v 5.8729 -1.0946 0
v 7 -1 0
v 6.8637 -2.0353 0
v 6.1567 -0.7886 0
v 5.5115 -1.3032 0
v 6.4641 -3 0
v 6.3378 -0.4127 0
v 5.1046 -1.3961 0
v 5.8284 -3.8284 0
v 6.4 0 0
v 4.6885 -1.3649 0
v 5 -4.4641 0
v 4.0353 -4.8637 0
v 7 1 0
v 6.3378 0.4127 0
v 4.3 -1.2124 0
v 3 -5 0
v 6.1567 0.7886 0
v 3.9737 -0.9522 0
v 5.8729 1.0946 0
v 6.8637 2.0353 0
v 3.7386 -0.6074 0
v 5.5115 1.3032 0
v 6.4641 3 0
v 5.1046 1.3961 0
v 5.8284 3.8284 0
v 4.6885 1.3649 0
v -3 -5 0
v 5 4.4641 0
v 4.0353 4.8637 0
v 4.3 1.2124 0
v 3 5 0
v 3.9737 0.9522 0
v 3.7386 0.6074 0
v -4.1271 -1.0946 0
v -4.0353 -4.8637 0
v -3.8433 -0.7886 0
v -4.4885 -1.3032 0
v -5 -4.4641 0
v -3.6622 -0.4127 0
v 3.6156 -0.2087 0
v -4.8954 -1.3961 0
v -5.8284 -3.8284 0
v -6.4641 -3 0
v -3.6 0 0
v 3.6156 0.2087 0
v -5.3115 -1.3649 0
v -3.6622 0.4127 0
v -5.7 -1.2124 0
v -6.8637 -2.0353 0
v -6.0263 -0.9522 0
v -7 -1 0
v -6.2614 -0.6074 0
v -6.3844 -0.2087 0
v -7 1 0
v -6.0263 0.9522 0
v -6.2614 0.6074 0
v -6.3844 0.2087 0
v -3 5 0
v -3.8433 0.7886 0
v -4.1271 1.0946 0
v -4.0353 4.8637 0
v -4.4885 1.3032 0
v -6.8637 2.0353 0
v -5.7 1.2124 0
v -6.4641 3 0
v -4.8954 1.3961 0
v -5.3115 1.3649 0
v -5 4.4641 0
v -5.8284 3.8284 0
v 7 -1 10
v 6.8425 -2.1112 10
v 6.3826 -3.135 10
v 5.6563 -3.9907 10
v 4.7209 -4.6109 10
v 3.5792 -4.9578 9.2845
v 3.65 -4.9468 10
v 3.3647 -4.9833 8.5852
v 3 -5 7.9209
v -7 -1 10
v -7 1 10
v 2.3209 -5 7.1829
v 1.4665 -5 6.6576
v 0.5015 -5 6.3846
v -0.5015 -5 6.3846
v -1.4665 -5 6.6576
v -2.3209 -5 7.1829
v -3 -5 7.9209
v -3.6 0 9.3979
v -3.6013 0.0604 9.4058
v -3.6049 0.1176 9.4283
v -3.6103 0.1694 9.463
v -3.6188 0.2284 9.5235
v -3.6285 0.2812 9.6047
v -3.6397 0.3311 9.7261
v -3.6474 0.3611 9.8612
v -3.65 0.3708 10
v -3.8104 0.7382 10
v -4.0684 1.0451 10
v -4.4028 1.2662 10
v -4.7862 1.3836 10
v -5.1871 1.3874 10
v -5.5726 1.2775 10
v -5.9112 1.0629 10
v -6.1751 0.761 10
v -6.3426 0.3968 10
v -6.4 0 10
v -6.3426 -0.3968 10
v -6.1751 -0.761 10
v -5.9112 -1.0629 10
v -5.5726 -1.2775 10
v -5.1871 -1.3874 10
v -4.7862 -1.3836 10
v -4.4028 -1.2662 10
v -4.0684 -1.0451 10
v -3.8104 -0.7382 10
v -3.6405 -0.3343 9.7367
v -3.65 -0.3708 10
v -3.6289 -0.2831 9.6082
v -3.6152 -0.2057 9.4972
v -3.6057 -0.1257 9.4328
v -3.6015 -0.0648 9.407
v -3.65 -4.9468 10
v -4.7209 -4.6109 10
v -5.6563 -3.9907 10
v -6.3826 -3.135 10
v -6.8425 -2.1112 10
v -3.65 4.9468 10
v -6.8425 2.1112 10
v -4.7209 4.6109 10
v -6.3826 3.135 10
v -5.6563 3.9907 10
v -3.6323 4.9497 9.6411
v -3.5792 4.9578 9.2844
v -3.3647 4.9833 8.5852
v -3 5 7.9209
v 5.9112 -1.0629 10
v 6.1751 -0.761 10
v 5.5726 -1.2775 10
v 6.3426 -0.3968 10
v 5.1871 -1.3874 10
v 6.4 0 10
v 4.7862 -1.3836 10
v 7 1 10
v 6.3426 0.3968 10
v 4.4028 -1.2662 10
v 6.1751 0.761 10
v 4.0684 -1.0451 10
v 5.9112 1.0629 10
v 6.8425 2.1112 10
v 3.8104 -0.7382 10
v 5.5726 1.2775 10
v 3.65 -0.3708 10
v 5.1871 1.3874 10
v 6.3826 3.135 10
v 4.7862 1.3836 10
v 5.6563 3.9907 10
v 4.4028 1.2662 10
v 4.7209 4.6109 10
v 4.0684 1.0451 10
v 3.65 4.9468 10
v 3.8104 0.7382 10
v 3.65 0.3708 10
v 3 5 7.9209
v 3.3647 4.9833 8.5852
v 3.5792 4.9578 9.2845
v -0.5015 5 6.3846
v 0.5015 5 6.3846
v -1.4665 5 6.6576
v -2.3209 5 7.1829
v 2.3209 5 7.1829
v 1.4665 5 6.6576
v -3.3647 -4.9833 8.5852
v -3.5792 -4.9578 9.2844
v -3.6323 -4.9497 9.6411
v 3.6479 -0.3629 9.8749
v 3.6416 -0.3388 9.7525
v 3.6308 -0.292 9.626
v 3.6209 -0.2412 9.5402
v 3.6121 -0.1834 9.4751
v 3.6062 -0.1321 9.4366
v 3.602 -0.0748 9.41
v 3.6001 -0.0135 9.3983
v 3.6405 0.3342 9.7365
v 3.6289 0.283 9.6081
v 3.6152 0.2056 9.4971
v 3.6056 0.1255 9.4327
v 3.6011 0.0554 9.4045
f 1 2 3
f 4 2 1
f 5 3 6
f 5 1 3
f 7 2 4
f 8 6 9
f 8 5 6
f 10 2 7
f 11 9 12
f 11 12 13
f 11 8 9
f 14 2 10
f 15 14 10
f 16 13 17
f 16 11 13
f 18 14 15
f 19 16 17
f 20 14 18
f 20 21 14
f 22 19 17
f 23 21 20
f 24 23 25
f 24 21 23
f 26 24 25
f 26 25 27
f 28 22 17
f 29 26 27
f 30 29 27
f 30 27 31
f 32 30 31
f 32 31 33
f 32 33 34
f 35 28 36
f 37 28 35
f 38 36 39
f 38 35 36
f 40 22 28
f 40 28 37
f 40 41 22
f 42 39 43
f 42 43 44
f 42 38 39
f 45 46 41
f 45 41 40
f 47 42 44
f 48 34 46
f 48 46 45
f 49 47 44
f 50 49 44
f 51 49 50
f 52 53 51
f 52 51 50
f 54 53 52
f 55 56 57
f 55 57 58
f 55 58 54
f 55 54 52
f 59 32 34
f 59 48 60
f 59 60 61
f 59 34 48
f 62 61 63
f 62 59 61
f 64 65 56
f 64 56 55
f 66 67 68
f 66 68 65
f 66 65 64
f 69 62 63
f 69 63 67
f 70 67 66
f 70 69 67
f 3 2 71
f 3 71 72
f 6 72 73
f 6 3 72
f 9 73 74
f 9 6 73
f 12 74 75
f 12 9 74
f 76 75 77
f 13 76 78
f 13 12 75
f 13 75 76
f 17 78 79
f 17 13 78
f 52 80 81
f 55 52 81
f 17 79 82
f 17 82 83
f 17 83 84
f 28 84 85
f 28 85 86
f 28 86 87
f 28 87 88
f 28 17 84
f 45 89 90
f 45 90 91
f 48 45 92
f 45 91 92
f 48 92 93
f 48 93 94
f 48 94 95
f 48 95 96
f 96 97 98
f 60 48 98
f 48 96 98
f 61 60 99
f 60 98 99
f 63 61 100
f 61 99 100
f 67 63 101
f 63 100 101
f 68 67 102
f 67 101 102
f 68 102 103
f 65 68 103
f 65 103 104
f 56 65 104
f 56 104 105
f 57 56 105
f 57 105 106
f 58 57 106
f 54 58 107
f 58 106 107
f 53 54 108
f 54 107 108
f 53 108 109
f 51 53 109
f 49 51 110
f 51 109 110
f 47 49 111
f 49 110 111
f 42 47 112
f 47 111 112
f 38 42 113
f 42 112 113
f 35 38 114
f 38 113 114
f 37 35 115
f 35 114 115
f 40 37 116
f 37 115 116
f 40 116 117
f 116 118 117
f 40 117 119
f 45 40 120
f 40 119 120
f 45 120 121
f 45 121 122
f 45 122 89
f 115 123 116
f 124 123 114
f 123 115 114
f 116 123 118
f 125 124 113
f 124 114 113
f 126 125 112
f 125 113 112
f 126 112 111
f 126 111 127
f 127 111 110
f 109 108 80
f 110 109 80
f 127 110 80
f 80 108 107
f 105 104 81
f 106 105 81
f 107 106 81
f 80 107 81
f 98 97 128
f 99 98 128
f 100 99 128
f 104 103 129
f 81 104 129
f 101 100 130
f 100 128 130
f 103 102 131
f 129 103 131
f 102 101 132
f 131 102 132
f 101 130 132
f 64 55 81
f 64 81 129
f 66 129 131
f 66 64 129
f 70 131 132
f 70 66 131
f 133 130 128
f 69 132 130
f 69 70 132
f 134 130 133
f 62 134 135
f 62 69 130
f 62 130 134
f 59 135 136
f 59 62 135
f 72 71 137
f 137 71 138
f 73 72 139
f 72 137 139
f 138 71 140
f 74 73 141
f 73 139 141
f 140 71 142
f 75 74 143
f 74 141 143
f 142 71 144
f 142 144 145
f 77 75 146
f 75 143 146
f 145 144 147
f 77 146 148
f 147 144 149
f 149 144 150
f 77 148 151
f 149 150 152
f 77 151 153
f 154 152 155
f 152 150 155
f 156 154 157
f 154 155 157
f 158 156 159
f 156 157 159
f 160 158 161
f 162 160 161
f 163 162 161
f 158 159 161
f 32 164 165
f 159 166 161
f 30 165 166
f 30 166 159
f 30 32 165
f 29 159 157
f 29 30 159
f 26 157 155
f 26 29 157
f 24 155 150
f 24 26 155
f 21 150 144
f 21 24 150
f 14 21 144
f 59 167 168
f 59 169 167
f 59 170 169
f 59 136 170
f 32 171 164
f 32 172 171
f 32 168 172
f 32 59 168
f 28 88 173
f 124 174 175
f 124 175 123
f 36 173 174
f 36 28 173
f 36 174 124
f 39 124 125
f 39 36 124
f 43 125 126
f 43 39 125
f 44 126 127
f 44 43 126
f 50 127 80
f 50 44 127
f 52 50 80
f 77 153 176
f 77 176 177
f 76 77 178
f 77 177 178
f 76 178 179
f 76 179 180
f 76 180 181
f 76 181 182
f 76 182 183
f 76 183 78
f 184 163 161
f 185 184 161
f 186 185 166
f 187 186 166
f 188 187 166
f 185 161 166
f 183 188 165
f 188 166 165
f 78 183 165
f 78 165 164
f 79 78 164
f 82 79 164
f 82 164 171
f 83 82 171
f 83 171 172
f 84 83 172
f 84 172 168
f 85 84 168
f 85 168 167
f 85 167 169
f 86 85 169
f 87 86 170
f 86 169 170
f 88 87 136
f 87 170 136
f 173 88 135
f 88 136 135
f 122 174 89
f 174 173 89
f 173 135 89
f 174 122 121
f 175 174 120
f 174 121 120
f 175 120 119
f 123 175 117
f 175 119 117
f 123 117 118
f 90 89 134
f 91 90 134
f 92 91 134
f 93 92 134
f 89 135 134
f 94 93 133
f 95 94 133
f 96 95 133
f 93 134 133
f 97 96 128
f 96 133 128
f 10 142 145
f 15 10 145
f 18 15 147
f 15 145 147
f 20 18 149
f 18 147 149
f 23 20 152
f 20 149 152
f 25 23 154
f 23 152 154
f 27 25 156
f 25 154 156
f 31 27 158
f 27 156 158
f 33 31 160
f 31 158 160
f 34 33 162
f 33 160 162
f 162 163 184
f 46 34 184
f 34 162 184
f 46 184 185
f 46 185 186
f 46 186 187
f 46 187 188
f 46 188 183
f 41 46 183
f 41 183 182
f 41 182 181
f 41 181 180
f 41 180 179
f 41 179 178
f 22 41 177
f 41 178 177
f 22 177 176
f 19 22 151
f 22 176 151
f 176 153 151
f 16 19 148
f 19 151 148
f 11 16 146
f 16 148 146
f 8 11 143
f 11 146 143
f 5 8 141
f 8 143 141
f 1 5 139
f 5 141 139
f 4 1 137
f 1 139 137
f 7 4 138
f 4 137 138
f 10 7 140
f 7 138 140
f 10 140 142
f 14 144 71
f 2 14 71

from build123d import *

# Parameters (mm, degrees)
EXTRUDE_1_DEPTH     = 10
CUT_EXTRUDE_1_REACH = 17.78
SKETCH_2_R          = 3.65
CUT_EXTRUDE_2_REACH = 15.191
SKETCH_3_R          = 1.4


with BuildPart() as part:
    # Эскиз1 → Бобышка-Вытянуть1 (new body)
    with BuildSketch(Plane.XY):
        with BuildLine():
            Line((-3, 5), (3, 5))
            ThreePointArc((3, 5), (5.828427125, 3.828427125), (7, 1))
            Line((7, 1), (7, -1))
            ThreePointArc((7, -1), (5.828427125, -3.828427125), (3, -5))
            Line((3, -5), (-3, -5))
            ThreePointArc((-3, -5), (-5.828427125, -3.828427125), (-7, -1))
            Line((-7, -1), (-7, 1))
            ThreePointArc((-7, 1), (-5.828427125, 3.828427125), (-3, 5))
        make_face()
    extrude(amount=EXTRUDE_1_DEPTH)

    # Эскиз2 → Вырез-Вытянуть1 (cut, up to next)
    with BuildSketch(Plane(origin=(0, 5, 0), x_dir=(1, 0, 0), z_dir=(0, 1, 0)), mode=Mode.PRIVATE) as cut_extrude_1_sk1:
        with Locations((0, -10)):
            Circle(SKETCH_2_R)
    cut_extrude_1_tool1 = extrude(cut_extrude_1_sk1.sketch, amount=-CUT_EXTRUDE_1_REACH, mode=Mode.PRIVATE) & part.part
    add(cut_extrude_1_tool1.solids().sort_by_distance((0, 5, 10))[0], mode=Mode.SUBTRACT)

    # Эскиз3 → Вырез-Вытянуть2 (cut, up to next)
    with BuildSketch(Plane.XY.offset(10), mode=Mode.PRIVATE) as cut_extrude_2_sk1:
        with Locations((-5, 0)):
            Circle(SKETCH_3_R)
    cut_extrude_2_tool1 = extrude(cut_extrude_2_sk1.sketch, amount=-CUT_EXTRUDE_2_REACH, mode=Mode.PRIVATE) & part.part
    # Эскиз3 → Вырез-Вытянуть2 (cut, up to next)
    with BuildSketch(Plane.XY.offset(10), mode=Mode.PRIVATE) as cut_extrude_2_sk2:
        with Locations((5, 0)):
            Circle(SKETCH_3_R)
    cut_extrude_2_tool2 = extrude(cut_extrude_2_sk2.sketch, amount=-CUT_EXTRUDE_2_REACH, mode=Mode.PRIVATE) & part.part
    add(cut_extrude_2_tool1.solids().sort_by_distance((-5, 0, 10))[0], mode=Mode.SUBTRACT)
    add(cut_extrude_2_tool2.solids().sort_by_distance((5, 0, 10))[0], mode=Mode.SUBTRACT)


solid = part.part
